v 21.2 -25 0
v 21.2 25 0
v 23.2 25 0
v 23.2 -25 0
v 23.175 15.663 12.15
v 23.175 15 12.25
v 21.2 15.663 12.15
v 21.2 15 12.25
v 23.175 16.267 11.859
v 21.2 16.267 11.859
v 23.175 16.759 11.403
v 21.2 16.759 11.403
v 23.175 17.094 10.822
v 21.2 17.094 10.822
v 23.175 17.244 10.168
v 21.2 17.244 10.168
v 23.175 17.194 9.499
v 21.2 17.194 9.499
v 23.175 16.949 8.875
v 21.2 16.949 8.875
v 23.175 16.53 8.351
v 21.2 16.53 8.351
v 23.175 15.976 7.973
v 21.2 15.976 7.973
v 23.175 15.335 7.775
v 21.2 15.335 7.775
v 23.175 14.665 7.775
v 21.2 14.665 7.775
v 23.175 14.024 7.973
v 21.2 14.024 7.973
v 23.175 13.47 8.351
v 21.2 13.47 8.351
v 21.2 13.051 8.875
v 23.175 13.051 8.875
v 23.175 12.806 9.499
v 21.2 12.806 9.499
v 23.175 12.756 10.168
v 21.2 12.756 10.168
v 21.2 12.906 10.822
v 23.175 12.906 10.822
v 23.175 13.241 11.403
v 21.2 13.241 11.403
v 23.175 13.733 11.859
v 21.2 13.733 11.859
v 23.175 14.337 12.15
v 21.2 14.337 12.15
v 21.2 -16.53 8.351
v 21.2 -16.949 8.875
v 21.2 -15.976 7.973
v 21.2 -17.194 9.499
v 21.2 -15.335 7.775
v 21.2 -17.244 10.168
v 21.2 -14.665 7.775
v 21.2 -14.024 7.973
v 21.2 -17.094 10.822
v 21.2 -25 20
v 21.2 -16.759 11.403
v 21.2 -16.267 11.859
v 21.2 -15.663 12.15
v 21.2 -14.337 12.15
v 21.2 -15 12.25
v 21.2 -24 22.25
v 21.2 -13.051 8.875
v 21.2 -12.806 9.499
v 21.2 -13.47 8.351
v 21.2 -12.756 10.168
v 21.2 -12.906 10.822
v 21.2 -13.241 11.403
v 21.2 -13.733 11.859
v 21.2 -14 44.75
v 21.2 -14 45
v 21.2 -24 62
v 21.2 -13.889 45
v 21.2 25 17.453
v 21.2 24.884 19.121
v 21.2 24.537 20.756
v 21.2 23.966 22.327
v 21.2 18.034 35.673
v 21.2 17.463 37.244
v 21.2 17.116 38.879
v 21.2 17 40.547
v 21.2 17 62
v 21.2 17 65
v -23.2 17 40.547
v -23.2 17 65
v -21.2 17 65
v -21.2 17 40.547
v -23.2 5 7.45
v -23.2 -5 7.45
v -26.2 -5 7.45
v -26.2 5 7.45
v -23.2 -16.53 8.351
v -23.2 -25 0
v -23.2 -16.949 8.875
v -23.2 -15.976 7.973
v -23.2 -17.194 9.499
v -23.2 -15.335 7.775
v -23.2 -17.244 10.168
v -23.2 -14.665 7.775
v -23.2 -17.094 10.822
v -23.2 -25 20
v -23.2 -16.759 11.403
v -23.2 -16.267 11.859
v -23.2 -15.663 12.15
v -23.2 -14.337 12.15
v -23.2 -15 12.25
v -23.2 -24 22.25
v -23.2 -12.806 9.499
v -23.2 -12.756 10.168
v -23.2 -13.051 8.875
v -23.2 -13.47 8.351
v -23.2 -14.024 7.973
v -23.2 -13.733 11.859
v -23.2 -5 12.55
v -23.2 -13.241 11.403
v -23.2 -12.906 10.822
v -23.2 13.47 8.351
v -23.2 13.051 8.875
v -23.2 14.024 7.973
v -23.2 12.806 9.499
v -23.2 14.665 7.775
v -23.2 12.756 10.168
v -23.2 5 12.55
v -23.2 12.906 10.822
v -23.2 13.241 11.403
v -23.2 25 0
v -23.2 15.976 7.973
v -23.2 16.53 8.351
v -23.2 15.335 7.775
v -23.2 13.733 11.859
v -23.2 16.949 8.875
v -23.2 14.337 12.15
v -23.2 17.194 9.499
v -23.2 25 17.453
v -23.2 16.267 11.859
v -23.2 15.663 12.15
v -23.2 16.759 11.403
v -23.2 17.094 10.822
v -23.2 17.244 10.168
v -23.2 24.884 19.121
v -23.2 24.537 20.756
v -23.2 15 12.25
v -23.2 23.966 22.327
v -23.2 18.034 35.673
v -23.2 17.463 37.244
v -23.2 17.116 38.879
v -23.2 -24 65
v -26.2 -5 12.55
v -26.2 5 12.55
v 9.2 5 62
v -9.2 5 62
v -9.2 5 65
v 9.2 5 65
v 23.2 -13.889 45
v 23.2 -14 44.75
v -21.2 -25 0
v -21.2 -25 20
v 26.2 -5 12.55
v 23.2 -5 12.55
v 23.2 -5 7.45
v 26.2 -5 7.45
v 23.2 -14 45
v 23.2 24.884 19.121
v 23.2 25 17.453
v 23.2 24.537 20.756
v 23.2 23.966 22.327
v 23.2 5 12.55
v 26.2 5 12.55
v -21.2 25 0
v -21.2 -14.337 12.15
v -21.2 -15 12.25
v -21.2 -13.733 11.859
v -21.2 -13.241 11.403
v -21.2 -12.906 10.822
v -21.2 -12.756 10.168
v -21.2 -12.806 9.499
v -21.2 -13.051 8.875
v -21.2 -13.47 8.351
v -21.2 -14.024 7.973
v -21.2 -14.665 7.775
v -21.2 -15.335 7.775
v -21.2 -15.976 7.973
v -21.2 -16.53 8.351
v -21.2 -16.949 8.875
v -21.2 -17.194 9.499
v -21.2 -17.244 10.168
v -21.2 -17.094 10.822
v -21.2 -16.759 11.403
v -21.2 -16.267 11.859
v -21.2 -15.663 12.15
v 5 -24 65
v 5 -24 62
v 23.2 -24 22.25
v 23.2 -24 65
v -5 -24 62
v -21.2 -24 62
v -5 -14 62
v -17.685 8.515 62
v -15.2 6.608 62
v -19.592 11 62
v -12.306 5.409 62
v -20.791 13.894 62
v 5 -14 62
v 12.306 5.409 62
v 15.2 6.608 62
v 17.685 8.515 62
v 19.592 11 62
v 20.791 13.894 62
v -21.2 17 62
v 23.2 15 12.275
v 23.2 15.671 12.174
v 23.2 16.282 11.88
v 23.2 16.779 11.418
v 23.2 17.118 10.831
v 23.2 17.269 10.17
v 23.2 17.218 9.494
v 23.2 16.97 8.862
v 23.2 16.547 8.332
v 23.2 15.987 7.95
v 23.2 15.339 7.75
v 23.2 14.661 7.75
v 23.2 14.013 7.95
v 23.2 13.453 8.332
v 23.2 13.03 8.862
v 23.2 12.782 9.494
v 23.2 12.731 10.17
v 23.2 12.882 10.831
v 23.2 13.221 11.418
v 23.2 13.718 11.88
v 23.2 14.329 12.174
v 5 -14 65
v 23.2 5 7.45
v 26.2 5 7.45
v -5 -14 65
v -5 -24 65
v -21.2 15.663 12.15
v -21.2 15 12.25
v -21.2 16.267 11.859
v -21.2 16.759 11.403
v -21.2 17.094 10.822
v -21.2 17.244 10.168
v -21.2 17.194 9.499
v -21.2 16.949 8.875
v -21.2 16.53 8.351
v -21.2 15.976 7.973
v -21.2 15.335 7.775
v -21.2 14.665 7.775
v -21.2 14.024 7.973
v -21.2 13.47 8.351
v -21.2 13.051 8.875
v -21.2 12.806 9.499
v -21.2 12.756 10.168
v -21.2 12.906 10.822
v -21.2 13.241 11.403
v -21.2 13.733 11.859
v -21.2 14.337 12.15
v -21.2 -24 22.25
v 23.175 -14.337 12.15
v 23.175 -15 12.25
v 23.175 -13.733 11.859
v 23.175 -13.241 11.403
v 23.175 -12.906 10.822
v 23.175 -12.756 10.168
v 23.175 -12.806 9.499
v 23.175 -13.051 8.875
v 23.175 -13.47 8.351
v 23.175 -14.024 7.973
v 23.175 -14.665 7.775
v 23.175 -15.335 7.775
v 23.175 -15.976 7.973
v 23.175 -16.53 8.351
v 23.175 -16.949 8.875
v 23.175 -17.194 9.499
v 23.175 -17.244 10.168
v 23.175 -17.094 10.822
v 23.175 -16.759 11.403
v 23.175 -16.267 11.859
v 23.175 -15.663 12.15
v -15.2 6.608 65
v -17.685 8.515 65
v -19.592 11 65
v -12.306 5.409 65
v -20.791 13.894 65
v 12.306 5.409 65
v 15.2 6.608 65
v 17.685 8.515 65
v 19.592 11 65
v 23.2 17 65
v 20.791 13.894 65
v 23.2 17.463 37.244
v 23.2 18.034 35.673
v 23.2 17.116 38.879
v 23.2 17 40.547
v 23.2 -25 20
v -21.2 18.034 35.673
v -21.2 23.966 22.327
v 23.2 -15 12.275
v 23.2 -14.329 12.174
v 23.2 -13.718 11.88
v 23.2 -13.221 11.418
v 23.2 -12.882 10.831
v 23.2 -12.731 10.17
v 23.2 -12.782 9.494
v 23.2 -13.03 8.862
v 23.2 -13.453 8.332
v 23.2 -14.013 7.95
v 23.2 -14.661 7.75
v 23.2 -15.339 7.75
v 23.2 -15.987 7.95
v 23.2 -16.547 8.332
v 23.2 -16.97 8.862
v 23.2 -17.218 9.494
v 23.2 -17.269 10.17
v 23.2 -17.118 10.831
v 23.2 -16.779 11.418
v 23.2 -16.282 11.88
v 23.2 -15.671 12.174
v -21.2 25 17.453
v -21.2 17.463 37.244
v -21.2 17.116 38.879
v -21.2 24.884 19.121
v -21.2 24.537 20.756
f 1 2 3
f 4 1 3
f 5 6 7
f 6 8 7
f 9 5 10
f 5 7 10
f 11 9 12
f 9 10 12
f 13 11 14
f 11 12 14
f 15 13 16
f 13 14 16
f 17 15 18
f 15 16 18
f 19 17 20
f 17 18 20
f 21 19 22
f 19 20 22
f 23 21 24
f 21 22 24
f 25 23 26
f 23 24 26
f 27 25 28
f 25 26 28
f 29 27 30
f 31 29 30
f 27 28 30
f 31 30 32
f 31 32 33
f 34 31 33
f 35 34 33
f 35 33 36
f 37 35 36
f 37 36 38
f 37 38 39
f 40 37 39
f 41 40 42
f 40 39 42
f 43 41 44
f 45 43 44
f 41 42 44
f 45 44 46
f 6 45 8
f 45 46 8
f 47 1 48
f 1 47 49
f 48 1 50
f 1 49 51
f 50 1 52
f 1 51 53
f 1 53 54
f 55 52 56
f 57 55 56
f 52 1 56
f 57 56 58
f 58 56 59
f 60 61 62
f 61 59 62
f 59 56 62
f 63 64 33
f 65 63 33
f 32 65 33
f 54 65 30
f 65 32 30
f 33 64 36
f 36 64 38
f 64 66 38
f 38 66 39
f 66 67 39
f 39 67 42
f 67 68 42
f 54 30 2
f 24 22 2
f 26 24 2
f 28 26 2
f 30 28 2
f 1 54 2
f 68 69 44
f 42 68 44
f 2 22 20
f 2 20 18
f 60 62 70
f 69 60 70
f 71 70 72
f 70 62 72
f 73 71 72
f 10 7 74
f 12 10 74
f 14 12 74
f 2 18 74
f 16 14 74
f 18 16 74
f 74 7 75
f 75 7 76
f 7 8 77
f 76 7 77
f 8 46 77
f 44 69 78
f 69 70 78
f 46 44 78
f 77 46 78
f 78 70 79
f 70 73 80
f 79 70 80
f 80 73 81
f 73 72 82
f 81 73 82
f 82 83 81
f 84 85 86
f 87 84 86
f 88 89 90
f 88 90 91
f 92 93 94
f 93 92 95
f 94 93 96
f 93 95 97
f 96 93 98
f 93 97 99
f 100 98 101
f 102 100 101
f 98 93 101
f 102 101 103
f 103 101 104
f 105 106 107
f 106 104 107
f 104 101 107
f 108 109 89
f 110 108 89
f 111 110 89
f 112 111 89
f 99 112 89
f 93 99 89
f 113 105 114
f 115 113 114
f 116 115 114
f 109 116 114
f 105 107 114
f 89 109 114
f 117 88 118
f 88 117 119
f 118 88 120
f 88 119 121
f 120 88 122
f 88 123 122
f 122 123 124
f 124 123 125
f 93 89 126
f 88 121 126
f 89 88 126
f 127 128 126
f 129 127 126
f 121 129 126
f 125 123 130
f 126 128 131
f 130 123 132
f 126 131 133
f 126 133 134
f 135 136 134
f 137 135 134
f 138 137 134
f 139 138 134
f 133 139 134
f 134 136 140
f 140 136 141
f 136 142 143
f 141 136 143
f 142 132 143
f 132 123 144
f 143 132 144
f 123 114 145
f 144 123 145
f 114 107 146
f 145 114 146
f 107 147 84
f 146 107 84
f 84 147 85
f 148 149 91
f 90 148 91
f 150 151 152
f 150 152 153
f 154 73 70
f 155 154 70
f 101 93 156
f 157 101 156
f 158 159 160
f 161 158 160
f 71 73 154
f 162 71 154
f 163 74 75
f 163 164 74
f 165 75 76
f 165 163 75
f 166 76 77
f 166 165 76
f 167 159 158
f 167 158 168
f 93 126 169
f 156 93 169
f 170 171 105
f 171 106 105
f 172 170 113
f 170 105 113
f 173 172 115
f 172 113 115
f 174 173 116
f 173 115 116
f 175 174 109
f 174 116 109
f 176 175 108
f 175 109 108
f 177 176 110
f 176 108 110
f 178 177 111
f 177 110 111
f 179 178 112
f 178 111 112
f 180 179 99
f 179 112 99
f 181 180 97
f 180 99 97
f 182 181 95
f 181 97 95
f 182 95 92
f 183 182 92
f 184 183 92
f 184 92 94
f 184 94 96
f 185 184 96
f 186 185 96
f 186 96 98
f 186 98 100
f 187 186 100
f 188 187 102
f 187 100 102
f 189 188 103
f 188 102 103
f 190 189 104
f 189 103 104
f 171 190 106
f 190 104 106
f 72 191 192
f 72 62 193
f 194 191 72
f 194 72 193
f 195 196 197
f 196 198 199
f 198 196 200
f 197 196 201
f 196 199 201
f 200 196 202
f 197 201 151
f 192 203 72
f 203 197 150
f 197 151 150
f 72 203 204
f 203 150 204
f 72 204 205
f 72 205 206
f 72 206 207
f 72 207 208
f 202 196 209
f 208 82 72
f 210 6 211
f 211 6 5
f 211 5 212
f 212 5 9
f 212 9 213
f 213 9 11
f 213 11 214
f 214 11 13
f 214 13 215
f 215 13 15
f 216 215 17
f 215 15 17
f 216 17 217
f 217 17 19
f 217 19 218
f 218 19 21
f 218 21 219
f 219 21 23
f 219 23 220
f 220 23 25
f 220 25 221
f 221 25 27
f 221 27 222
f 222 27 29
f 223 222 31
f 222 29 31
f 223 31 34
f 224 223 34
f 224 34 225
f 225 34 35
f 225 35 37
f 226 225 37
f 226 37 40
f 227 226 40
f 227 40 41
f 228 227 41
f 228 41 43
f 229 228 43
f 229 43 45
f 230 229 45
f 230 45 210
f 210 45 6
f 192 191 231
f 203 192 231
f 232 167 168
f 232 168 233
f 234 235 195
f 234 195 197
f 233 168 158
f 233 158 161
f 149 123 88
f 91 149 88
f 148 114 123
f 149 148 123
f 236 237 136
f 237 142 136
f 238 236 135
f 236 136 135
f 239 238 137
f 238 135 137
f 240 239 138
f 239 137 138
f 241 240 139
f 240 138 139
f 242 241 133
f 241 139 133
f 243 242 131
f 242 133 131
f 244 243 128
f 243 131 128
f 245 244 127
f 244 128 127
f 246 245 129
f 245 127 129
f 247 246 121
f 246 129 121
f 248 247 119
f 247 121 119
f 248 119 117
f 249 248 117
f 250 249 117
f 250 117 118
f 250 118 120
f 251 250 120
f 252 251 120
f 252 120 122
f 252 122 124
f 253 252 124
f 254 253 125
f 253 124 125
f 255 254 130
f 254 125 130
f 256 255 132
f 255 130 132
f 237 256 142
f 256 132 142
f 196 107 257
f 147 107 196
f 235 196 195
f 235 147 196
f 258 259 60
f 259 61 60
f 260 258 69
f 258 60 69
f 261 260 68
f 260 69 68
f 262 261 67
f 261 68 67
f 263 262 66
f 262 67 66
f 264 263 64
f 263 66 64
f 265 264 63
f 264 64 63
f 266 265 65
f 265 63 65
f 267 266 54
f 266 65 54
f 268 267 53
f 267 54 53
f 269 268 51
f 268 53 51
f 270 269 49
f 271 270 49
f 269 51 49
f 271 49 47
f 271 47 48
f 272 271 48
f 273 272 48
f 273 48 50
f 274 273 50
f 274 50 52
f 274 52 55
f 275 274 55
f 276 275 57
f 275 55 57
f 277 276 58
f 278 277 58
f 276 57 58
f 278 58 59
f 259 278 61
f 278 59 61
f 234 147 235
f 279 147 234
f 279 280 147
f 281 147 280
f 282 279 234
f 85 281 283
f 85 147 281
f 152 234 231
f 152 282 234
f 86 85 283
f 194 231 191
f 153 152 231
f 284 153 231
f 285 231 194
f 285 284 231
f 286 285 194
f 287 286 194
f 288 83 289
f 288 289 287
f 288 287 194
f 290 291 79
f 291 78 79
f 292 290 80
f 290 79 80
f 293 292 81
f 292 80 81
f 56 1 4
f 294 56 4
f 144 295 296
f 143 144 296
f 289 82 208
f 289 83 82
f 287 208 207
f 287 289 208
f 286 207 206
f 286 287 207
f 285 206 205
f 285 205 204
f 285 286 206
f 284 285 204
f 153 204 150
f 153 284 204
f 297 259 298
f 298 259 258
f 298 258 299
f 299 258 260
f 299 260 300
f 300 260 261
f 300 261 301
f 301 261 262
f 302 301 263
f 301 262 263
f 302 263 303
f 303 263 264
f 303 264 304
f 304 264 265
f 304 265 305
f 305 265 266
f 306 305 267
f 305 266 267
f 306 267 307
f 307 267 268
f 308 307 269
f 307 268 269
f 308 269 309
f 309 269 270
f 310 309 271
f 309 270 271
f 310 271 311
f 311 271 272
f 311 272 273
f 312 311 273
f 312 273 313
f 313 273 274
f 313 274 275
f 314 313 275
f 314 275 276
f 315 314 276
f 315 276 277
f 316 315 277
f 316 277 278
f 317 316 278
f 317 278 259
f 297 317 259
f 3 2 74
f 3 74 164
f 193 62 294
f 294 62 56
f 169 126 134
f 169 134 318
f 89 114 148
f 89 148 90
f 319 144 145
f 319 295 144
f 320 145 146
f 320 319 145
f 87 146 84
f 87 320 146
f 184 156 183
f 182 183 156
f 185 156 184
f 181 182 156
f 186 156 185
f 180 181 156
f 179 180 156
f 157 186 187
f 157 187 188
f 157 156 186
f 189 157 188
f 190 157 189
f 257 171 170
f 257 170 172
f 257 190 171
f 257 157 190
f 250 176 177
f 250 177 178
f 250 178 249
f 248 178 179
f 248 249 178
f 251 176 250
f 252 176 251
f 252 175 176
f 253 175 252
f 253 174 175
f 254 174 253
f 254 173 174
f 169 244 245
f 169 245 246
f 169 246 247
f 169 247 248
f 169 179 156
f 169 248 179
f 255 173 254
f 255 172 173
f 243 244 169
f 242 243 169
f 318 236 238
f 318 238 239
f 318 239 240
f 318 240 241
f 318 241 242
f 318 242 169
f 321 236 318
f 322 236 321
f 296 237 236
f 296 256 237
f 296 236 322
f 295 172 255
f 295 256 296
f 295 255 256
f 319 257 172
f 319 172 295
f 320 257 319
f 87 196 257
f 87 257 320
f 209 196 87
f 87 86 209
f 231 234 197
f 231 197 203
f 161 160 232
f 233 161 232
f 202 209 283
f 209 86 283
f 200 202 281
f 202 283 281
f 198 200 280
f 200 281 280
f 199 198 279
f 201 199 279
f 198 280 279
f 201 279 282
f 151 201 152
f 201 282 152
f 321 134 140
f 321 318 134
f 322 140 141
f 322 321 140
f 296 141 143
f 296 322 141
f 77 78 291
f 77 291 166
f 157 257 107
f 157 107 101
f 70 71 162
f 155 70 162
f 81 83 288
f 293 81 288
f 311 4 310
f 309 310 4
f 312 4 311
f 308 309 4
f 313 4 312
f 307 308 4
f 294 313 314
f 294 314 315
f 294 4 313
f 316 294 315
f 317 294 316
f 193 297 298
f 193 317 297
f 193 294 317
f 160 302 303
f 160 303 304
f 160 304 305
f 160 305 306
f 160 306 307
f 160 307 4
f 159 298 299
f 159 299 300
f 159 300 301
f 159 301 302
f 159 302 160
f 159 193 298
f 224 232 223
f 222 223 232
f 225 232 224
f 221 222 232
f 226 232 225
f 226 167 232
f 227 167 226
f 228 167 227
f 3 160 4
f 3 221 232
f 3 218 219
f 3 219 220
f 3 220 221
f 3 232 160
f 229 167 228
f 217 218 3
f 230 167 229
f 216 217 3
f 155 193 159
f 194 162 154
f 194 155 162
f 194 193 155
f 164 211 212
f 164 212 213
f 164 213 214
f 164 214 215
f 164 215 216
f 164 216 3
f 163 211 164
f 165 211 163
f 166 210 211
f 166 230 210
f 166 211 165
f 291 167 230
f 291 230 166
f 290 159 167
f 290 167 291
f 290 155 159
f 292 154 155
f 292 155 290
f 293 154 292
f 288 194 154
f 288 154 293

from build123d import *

# Parameters (mm, degrees)
SKETCH_1_W                   = 2
SKETCH_1_H                   = 10
EXTRUDE_1_DEPTH              = 62
EXTRUDE_1_2_DEPTH            = 62
SKETCH_2_W                   = 46.4
SKETCH_2_H                   = 10
EXTRUDE_2_DEPTH              = 3
SKETCH_3_W                   = 2
SKETCH_3_H                   = 20
EXTRUDE_3_DEPTH              = 20
EXTRUDE_4_DEPTH              = 2
MIRROR_3_COPY_1_SKETCH_W     = 2
MIRROR_3_COPY_1_SKETCH_H     = 20
MIRROR_3_COPY_1_DEPTH        = 20
MIRROR_3_COPY_2_DEPTH        = 2
MIRROR_3_COPY_3_SKETCH_W     = 2
MIRROR_3_COPY_3_SKETCH_H     = 20
MIRROR_3_COPY_3_DEPTH        = 20
EXTRUDE_5_DEPTH              = 9
HOLE_WIZARD_M4_1_D           = 4.5
HOLE_WIZARD_M4_1_CSINK_D     = 4.55
HOLE_WIZARD_M4_1_CSINK_ANGLE = 90
SKETCH_10_W                  = 5.1
SKETCH_10_H                  = 10
EXTRUDE_6_DEPTH              = 3
EXTRUDE_7_DEPTH              = 10
EXTRUDE_8_REACH              = 76.407
SKETCH_12_W                  = 2
SKETCH_12_H                  = 22
SKETCH_13_W                  = 10
SKETCH_13_H                  = 10
CUT_EXTRUDE_1_DEPTH          = 10
FILLET_1_R                   = 12
FILLET_2_R                   = 12


with BuildPart() as part:
    # 스케치1 → 보스-돌출1 (new body)
    with BuildSketch(Plane.XY):
        with Locations((-22.2, 0)):
            Rectangle(SKETCH_1_W, SKETCH_1_H)
    extrude(amount=EXTRUDE_1_DEPTH)



with BuildPart() as body_2:
    # 스케치1 → Extrude 1 2 (new body)
    with BuildSketch(Plane.XY):
        with Locations((22.2, 0)):
            Rectangle(SKETCH_1_W, SKETCH_1_H)
    extrude(amount=EXTRUDE_1_2_DEPTH)


with BuildPart() as part_1:
    add(part.part)

    add(body_2.part)  # 보스-돌출2 merges body 2
    # 스케치2 → 보스-돌출2 (add)
    with BuildSketch(Plane.XY.offset(62)):
        Rectangle(SKETCH_2_W, SKETCH_2_H)
    extrude(amount=EXTRUDE_2_DEPTH)

    # 스케치3 → 보스-돌출3 (add)
    with BuildSketch(Plane(origin=(0, 5, 0), x_dir=(1, 0, 0), z_dir=(0, 1, 0))):
        with Locations((-22.2, -10)):
            Rectangle(SKETCH_3_W, SKETCH_3_H)
        with Locations((22.2, -10)):
            Rectangle(SKETCH_3_W, SKETCH_3_H)
    extrude_3 = extrude(amount=EXTRUDE_3_DEPTH)

    # 스케치4 → 보스-돌출4 (add)
    with BuildSketch(Plane.ZY.offset(-21.2)):
        Polygon((20, 25), (20, 5), (65, 5), align=None)
    extrude_4 = extrude(amount=-EXTRUDE_4_DEPTH)

    # 대칭 복사1: 보스-돌출3, 보스-돌출4 across plane
    add(extrude_3.mirror(Plane.ZX))
    add(extrude_4.mirror(Plane.ZX))

    # 대칭 복사3: 보스-돌출4 across plane
    add(extrude_4.mirror(Plane.ZY))

    # 대칭 복사3 copy 1 sketch → 대칭 복사3 copy 1 (add)
    with BuildSketch(Plane(origin=(0, -5, 0), x_dir=(-1, 0, 0), z_dir=(0, -1, 0))):
        with Locations((-22.2, -10)):
            Rectangle(MIRROR_3_COPY_1_SKETCH_W, MIRROR_3_COPY_1_SKETCH_H)
        with Locations((22.2, -10)):
            Rectangle(MIRROR_3_COPY_1_SKETCH_W, MIRROR_3_COPY_1_SKETCH_H)
    extrude(amount=MIRROR_3_COPY_1_DEPTH)

    # 대칭 복사3 copy 2 sketch → 대칭 복사3 copy 2 (add)
    with BuildSketch(Plane(origin=(-21.2, 0, 0), x_dir=(0, 0, 1), z_dir=(1, 0, 0))):
        Polygon((20, 25), (20, 5), (65, 5), align=None)
    extrude(amount=-MIRROR_3_COPY_2_DEPTH)

    # 대칭 복사3 copy 3 sketch → 대칭 복사3 copy 3 (add)
    with BuildSketch(Plane(origin=(0, 5, 0), x_dir=(-1, 0, 0), z_dir=(0, 1, 0))):
        with Locations((-22.2, 10)):
            Rectangle(MIRROR_3_COPY_3_SKETCH_W, MIRROR_3_COPY_3_SKETCH_H)
        with Locations((22.2, 10)):
            Rectangle(MIRROR_3_COPY_3_SKETCH_W, MIRROR_3_COPY_3_SKETCH_H)
    extrude(amount=MIRROR_3_COPY_3_DEPTH)

    # 스케치6 → 보스-돌출5 (add)
    with BuildSketch(Plane.XZ.offset(5)):
        Polygon((-23.2, 65), (-23.2, 44.637351208), (-21.2, 44.637351208), (-21.2, 62), (21.2, 62), (21.2, 45), (23.2, 45), (23.2, 65), align=None)
    extrude(amount=EXTRUDE_5_DEPTH)

    # M4 여유 구멍1 (through all)
    with Locations(Plane(origin=(23.2, 0, 0), x_dir=(0, 0, -1), z_dir=(1, 0, 0))):
        with Locations((-10, -15), (-10, 15)):
            CounterSinkHole(HOLE_WIZARD_M4_1_D / 2, HOLE_WIZARD_M4_1_CSINK_D / 2, counter_sink_angle=HOLE_WIZARD_M4_1_CSINK_ANGLE)

    # 스케치10 → 보스-돌출6 (add)
    with BuildSketch(Plane(origin=(23.2, 0, 0), x_dir=(0, 0, -1), z_dir=(1, 0, 0))):
        with Locations((-10, 0)):
            Rectangle(SKETCH_10_W, SKETCH_10_H)
    extrude_6 = extrude(amount=EXTRUDE_6_DEPTH)

    # 대칭 복사4: 보스-돌출6 across plane
    add(extrude_6.mirror(Plane.ZY))

    # 스케치11 → 보스-돌출7 (add)
    with BuildSketch(Plane.XZ.offset(14)):
        Polygon((-23.2, 15), (-21.2, 15), (-21.2, 62), (21.2, 62), (21.2, 15), (23.2, 15), (23.2, 65), (-23.2, 65), align=None)
    extrude(amount=EXTRUDE_7_DEPTH)

    # 스케치12 → 보스-돌출8 (add, up to next)
    with BuildSketch(Plane.XY.offset(65), mode=Mode.PRIVATE) as extrude_8_sk1:
        with Locations((-22.2, 6)):
            Rectangle(SKETCH_12_W, SKETCH_12_H)
    extrude_8_tool1 = extrude(extrude_8_sk1.sketch, amount=-EXTRUDE_8_REACH, mode=Mode.PRIVATE) - part_1.part
    # 스케치12 → 보스-돌출8 (add, up to next)
    with BuildSketch(Plane.XY.offset(65), mode=Mode.PRIVATE) as extrude_8_sk2:
        with Locations((22.2, 6)):
            Rectangle(SKETCH_12_W, SKETCH_12_H)
    extrude_8_tool2 = extrude(extrude_8_sk2.sketch, amount=-EXTRUDE_8_REACH, mode=Mode.PRIVATE) - part_1.part
    add(extrude_8_tool1.solids().sort_by_distance((-22.2, 6, 65))[0])
    add(extrude_8_tool2.solids().sort_by_distance((22.2, 6, 65))[0])

    # 스케치13 → 컷-돌출1 (cut)
    with BuildSketch(Plane.XY.offset(65)):
        with Locations((0, -19)):
            Rectangle(SKETCH_13_W, SKETCH_13_H)
    extrude(amount=-CUT_EXTRUDE_1_DEPTH, mode=Mode.SUBTRACT)

    # 필렛1
    fillet_1_edges = [part_1.edges().sort_by_distance(p)[0] for p in [
        (21.2, 5, 63.5),
        (-21.2, 5, 63.5),
    ]]
    fillet(fillet_1_edges, radius=FILLET_1_R - 0.0001)  # a hair under: the kernel refuses the full size

    # 필렛2
    fillet_2_edges = [part_1.edges().sort_by_distance(p)[0] for p in [
        (-22.2, 17, 38),
        (22.2, 17, 38),
        (-22.2, 25, 20),
        (22.2, 25, 20),
    ]]
    fillet(fillet_2_edges, radius=FILLET_2_R)


solid = part_1.part
